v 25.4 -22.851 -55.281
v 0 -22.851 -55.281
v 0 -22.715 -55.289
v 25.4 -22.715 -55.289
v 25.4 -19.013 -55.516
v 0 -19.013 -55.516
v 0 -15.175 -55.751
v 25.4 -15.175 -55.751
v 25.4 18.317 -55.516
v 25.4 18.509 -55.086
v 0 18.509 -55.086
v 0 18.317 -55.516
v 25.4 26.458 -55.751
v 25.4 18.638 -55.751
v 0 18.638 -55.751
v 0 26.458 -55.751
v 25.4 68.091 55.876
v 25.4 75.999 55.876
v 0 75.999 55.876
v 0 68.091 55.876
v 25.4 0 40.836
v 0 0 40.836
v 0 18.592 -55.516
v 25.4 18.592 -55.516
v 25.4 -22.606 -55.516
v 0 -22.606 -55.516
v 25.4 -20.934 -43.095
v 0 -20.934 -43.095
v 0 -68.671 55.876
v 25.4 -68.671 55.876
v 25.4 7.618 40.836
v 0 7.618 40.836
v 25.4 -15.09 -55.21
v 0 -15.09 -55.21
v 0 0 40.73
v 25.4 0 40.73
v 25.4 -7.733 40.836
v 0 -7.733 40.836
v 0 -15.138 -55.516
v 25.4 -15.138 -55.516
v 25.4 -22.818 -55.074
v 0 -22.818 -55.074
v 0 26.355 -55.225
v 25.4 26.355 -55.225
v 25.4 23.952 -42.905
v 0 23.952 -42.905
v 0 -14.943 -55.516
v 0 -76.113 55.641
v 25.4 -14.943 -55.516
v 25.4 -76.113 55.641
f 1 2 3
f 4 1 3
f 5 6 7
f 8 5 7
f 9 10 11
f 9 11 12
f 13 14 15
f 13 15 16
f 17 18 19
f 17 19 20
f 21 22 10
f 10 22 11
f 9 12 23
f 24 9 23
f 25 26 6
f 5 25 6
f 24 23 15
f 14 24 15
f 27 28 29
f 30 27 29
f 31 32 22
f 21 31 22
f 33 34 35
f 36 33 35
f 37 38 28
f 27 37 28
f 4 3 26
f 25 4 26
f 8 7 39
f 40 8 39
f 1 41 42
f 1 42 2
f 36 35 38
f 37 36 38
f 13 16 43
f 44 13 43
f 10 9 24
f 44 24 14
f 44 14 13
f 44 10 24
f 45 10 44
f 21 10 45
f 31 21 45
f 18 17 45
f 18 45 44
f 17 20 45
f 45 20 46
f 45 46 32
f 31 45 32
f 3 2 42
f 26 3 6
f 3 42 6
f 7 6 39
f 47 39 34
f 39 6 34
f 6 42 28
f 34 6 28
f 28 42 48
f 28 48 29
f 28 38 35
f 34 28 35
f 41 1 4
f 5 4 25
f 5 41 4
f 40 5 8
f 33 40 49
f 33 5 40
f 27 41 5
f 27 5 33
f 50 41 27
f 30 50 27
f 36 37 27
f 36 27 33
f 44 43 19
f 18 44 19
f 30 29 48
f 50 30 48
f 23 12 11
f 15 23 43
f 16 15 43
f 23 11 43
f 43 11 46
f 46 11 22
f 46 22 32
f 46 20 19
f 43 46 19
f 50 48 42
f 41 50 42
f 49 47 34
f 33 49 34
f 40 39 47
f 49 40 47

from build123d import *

# Parameters (mm, degrees)
F1_DEPTH = 25.4
F3_DEPTH = 25.4
F5_DEPTH = 25.4
F7_DEPTH = 25.4


with BuildPart() as f1:
    # F0 (on Right) → F1 (new body)
    with BuildSketch(Plane.YZ):
        Polygon((-68.670519, 55.875912), (-76.113306, 55.64091), (-22.605574, -55.515818), (-14.942871, -55.515818), align=None)
    extrude(amount=F1_DEPTH)

    # F2 (on Right) → F3 (join)
    with BuildSketch(Plane.YZ):
        Polygon((-22.850838, -55.280816), (-15.175458, -55.750825), (0, 40.729901), (-7.732669, 40.835682), align=None)
    extrude(amount=F3_DEPTH)


with BuildPart() as f5:
    # F4 (on Right) → F5 (new body)
    with BuildSketch(Plane.YZ):
        Polygon((7.618089, 40.835682), (0, 40.835682), (18.637602, -55.750825), (26.457652, -55.750825), align=None)
    extrude(amount=F5_DEPTH)

    # F6 (on Right) → F7 (join)
    with BuildSketch(Plane.YZ):
        Polygon((18.317102, -55.515818), (26.225064, -55.515818), (75.998731, 55.875912), (68.090769, 55.875912), align=None)
    extrude(amount=F7_DEPTH)


solid = Compound([f1.part, f5.part])
